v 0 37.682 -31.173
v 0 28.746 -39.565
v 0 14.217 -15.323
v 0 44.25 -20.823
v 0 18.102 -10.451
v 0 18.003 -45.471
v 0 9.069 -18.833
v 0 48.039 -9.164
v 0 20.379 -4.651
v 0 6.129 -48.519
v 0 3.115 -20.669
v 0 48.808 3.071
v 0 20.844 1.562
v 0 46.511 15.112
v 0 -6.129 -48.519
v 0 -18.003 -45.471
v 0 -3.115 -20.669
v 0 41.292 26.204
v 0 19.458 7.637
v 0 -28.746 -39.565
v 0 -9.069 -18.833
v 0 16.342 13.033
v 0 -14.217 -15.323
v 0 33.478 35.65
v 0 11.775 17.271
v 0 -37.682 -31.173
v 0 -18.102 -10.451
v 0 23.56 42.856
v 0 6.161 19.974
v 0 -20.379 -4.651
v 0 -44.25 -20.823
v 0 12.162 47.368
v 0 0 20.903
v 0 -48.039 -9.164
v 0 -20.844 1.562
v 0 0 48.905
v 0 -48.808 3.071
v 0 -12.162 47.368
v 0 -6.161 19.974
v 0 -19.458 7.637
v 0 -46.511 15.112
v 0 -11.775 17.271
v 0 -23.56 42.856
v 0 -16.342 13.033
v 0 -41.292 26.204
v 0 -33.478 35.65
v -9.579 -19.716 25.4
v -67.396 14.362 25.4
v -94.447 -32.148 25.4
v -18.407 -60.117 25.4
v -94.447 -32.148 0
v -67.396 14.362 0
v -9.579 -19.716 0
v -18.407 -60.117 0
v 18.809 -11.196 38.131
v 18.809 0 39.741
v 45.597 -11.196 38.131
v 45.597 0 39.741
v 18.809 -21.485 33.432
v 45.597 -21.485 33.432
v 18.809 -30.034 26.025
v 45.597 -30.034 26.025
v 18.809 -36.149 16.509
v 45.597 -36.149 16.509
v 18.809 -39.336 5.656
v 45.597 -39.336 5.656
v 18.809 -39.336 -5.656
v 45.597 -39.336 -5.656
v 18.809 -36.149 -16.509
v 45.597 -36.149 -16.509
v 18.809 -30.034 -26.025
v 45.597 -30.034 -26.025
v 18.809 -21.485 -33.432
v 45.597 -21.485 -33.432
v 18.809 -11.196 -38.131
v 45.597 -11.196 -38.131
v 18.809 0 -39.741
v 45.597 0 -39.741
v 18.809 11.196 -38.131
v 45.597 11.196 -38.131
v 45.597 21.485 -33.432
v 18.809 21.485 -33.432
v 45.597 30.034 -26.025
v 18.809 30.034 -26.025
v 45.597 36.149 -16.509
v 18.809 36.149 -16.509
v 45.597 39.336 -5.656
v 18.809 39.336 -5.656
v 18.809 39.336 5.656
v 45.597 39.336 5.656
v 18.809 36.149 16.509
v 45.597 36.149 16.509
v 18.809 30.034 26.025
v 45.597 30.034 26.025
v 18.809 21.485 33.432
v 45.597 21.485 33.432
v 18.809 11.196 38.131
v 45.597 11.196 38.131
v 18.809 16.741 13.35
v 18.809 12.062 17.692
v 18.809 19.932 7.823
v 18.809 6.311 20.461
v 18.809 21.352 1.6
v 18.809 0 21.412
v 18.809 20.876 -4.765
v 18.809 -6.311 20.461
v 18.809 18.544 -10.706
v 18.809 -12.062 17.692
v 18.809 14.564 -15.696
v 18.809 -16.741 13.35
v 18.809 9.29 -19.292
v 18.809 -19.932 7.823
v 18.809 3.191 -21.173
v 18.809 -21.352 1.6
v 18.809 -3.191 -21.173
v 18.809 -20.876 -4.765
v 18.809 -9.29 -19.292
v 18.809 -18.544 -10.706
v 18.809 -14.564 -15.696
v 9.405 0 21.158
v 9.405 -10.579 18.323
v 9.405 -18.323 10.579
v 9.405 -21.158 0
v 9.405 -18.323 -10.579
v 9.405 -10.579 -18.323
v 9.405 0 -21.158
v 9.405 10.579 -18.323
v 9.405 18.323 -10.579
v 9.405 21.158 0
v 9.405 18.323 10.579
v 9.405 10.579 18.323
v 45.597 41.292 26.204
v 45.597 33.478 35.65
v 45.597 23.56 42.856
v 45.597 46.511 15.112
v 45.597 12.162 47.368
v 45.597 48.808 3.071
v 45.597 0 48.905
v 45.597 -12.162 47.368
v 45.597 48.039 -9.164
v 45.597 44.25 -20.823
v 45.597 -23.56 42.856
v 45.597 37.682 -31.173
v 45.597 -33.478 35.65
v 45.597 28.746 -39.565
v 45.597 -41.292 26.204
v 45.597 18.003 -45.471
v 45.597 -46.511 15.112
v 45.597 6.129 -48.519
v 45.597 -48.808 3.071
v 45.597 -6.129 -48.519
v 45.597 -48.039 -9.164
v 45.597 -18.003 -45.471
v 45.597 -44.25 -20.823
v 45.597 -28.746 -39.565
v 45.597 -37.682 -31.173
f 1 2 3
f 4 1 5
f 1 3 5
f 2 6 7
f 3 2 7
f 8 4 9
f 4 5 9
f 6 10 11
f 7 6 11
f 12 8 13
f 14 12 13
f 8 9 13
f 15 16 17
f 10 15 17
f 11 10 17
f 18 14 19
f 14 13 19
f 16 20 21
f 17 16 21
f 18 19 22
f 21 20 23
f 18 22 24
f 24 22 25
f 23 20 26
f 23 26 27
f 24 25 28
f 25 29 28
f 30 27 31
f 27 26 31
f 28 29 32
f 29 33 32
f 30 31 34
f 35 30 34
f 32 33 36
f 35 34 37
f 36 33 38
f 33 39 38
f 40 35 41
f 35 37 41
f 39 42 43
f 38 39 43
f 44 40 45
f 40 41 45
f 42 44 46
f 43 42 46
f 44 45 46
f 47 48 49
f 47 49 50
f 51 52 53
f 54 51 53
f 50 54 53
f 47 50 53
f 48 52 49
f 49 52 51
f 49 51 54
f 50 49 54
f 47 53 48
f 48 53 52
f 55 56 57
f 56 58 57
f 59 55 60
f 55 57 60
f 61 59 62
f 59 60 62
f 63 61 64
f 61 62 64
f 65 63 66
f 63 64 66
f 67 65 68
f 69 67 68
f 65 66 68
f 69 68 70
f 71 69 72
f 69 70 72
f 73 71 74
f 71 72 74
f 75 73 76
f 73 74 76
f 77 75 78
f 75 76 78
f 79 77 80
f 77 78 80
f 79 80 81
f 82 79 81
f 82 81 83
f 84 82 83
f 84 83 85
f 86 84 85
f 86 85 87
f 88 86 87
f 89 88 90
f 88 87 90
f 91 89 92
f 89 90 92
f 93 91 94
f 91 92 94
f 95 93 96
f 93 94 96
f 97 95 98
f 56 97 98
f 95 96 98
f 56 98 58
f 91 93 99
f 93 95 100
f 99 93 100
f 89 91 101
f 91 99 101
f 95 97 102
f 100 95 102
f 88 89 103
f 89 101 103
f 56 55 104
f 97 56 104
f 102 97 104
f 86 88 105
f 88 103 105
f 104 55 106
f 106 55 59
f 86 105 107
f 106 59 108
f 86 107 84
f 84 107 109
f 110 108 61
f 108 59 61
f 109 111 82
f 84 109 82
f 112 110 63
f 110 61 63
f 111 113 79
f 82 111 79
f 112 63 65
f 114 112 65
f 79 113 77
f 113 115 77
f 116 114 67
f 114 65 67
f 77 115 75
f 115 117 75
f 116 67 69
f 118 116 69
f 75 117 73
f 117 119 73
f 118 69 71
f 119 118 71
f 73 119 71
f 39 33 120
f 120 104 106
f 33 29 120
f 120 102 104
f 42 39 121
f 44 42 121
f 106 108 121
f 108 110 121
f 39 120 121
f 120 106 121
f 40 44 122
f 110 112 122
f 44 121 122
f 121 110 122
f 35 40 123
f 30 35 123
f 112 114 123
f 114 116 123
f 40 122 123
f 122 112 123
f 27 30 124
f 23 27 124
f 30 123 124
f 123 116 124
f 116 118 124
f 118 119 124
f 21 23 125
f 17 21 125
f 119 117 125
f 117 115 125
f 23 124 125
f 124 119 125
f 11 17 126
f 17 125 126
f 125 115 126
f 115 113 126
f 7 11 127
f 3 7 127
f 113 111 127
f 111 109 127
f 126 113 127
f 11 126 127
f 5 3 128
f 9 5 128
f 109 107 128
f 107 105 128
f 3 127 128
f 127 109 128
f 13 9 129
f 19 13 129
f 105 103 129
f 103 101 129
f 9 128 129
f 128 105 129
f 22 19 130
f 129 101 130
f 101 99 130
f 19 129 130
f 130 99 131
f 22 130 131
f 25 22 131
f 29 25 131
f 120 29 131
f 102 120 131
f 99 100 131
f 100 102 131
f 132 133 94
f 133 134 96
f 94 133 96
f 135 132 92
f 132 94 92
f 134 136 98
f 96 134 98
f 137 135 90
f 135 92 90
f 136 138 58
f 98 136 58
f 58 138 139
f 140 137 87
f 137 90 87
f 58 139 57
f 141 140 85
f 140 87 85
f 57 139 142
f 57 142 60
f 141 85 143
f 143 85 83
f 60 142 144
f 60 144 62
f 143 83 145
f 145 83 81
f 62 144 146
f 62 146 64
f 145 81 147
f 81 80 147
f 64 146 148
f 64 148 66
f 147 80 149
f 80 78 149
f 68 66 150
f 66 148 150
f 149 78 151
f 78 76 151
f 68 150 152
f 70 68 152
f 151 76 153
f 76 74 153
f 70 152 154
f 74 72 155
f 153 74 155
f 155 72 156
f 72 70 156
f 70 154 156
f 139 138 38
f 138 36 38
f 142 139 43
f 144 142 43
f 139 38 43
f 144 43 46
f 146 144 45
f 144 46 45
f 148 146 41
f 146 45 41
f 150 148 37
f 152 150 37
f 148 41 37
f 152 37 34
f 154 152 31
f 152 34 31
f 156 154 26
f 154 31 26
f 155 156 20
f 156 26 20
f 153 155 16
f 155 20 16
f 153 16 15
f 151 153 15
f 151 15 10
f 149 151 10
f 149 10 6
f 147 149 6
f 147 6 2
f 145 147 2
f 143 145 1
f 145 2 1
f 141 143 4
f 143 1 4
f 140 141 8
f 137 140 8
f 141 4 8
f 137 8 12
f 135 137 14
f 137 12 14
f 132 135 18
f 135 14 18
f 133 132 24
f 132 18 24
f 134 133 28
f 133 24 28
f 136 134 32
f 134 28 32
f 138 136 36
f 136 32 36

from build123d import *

# Parameters (mm, degrees)
F1_DEPTH = 25.4


with BuildPart() as f1:
    # F0 (on Top) → F1 (new body)
    with BuildSketch(Plane.XY):
        Polygon((-67.396291, 14.36167), (-94.447203, -32.148179), (-18.406587, -60.117286), (-9.579491, -19.715818), align=None)
    extrude(amount=F1_DEPTH)


with BuildPart() as f3:
    # F2 (on Front) → F3 (revolve)
    with BuildSketch(Plane.XZ):
        Polygon((0, 48.904791), (0, 20.902765), (18.80941, 21.412369), (18.80941, 39.740648), (45.59689, 39.740648), (45.59689, 48.904791), align=None)
    revolve(axis=Axis((19.755913, 0, 0), (1, 0, 0)))


solid = Compound([f1.part, f3.part])
